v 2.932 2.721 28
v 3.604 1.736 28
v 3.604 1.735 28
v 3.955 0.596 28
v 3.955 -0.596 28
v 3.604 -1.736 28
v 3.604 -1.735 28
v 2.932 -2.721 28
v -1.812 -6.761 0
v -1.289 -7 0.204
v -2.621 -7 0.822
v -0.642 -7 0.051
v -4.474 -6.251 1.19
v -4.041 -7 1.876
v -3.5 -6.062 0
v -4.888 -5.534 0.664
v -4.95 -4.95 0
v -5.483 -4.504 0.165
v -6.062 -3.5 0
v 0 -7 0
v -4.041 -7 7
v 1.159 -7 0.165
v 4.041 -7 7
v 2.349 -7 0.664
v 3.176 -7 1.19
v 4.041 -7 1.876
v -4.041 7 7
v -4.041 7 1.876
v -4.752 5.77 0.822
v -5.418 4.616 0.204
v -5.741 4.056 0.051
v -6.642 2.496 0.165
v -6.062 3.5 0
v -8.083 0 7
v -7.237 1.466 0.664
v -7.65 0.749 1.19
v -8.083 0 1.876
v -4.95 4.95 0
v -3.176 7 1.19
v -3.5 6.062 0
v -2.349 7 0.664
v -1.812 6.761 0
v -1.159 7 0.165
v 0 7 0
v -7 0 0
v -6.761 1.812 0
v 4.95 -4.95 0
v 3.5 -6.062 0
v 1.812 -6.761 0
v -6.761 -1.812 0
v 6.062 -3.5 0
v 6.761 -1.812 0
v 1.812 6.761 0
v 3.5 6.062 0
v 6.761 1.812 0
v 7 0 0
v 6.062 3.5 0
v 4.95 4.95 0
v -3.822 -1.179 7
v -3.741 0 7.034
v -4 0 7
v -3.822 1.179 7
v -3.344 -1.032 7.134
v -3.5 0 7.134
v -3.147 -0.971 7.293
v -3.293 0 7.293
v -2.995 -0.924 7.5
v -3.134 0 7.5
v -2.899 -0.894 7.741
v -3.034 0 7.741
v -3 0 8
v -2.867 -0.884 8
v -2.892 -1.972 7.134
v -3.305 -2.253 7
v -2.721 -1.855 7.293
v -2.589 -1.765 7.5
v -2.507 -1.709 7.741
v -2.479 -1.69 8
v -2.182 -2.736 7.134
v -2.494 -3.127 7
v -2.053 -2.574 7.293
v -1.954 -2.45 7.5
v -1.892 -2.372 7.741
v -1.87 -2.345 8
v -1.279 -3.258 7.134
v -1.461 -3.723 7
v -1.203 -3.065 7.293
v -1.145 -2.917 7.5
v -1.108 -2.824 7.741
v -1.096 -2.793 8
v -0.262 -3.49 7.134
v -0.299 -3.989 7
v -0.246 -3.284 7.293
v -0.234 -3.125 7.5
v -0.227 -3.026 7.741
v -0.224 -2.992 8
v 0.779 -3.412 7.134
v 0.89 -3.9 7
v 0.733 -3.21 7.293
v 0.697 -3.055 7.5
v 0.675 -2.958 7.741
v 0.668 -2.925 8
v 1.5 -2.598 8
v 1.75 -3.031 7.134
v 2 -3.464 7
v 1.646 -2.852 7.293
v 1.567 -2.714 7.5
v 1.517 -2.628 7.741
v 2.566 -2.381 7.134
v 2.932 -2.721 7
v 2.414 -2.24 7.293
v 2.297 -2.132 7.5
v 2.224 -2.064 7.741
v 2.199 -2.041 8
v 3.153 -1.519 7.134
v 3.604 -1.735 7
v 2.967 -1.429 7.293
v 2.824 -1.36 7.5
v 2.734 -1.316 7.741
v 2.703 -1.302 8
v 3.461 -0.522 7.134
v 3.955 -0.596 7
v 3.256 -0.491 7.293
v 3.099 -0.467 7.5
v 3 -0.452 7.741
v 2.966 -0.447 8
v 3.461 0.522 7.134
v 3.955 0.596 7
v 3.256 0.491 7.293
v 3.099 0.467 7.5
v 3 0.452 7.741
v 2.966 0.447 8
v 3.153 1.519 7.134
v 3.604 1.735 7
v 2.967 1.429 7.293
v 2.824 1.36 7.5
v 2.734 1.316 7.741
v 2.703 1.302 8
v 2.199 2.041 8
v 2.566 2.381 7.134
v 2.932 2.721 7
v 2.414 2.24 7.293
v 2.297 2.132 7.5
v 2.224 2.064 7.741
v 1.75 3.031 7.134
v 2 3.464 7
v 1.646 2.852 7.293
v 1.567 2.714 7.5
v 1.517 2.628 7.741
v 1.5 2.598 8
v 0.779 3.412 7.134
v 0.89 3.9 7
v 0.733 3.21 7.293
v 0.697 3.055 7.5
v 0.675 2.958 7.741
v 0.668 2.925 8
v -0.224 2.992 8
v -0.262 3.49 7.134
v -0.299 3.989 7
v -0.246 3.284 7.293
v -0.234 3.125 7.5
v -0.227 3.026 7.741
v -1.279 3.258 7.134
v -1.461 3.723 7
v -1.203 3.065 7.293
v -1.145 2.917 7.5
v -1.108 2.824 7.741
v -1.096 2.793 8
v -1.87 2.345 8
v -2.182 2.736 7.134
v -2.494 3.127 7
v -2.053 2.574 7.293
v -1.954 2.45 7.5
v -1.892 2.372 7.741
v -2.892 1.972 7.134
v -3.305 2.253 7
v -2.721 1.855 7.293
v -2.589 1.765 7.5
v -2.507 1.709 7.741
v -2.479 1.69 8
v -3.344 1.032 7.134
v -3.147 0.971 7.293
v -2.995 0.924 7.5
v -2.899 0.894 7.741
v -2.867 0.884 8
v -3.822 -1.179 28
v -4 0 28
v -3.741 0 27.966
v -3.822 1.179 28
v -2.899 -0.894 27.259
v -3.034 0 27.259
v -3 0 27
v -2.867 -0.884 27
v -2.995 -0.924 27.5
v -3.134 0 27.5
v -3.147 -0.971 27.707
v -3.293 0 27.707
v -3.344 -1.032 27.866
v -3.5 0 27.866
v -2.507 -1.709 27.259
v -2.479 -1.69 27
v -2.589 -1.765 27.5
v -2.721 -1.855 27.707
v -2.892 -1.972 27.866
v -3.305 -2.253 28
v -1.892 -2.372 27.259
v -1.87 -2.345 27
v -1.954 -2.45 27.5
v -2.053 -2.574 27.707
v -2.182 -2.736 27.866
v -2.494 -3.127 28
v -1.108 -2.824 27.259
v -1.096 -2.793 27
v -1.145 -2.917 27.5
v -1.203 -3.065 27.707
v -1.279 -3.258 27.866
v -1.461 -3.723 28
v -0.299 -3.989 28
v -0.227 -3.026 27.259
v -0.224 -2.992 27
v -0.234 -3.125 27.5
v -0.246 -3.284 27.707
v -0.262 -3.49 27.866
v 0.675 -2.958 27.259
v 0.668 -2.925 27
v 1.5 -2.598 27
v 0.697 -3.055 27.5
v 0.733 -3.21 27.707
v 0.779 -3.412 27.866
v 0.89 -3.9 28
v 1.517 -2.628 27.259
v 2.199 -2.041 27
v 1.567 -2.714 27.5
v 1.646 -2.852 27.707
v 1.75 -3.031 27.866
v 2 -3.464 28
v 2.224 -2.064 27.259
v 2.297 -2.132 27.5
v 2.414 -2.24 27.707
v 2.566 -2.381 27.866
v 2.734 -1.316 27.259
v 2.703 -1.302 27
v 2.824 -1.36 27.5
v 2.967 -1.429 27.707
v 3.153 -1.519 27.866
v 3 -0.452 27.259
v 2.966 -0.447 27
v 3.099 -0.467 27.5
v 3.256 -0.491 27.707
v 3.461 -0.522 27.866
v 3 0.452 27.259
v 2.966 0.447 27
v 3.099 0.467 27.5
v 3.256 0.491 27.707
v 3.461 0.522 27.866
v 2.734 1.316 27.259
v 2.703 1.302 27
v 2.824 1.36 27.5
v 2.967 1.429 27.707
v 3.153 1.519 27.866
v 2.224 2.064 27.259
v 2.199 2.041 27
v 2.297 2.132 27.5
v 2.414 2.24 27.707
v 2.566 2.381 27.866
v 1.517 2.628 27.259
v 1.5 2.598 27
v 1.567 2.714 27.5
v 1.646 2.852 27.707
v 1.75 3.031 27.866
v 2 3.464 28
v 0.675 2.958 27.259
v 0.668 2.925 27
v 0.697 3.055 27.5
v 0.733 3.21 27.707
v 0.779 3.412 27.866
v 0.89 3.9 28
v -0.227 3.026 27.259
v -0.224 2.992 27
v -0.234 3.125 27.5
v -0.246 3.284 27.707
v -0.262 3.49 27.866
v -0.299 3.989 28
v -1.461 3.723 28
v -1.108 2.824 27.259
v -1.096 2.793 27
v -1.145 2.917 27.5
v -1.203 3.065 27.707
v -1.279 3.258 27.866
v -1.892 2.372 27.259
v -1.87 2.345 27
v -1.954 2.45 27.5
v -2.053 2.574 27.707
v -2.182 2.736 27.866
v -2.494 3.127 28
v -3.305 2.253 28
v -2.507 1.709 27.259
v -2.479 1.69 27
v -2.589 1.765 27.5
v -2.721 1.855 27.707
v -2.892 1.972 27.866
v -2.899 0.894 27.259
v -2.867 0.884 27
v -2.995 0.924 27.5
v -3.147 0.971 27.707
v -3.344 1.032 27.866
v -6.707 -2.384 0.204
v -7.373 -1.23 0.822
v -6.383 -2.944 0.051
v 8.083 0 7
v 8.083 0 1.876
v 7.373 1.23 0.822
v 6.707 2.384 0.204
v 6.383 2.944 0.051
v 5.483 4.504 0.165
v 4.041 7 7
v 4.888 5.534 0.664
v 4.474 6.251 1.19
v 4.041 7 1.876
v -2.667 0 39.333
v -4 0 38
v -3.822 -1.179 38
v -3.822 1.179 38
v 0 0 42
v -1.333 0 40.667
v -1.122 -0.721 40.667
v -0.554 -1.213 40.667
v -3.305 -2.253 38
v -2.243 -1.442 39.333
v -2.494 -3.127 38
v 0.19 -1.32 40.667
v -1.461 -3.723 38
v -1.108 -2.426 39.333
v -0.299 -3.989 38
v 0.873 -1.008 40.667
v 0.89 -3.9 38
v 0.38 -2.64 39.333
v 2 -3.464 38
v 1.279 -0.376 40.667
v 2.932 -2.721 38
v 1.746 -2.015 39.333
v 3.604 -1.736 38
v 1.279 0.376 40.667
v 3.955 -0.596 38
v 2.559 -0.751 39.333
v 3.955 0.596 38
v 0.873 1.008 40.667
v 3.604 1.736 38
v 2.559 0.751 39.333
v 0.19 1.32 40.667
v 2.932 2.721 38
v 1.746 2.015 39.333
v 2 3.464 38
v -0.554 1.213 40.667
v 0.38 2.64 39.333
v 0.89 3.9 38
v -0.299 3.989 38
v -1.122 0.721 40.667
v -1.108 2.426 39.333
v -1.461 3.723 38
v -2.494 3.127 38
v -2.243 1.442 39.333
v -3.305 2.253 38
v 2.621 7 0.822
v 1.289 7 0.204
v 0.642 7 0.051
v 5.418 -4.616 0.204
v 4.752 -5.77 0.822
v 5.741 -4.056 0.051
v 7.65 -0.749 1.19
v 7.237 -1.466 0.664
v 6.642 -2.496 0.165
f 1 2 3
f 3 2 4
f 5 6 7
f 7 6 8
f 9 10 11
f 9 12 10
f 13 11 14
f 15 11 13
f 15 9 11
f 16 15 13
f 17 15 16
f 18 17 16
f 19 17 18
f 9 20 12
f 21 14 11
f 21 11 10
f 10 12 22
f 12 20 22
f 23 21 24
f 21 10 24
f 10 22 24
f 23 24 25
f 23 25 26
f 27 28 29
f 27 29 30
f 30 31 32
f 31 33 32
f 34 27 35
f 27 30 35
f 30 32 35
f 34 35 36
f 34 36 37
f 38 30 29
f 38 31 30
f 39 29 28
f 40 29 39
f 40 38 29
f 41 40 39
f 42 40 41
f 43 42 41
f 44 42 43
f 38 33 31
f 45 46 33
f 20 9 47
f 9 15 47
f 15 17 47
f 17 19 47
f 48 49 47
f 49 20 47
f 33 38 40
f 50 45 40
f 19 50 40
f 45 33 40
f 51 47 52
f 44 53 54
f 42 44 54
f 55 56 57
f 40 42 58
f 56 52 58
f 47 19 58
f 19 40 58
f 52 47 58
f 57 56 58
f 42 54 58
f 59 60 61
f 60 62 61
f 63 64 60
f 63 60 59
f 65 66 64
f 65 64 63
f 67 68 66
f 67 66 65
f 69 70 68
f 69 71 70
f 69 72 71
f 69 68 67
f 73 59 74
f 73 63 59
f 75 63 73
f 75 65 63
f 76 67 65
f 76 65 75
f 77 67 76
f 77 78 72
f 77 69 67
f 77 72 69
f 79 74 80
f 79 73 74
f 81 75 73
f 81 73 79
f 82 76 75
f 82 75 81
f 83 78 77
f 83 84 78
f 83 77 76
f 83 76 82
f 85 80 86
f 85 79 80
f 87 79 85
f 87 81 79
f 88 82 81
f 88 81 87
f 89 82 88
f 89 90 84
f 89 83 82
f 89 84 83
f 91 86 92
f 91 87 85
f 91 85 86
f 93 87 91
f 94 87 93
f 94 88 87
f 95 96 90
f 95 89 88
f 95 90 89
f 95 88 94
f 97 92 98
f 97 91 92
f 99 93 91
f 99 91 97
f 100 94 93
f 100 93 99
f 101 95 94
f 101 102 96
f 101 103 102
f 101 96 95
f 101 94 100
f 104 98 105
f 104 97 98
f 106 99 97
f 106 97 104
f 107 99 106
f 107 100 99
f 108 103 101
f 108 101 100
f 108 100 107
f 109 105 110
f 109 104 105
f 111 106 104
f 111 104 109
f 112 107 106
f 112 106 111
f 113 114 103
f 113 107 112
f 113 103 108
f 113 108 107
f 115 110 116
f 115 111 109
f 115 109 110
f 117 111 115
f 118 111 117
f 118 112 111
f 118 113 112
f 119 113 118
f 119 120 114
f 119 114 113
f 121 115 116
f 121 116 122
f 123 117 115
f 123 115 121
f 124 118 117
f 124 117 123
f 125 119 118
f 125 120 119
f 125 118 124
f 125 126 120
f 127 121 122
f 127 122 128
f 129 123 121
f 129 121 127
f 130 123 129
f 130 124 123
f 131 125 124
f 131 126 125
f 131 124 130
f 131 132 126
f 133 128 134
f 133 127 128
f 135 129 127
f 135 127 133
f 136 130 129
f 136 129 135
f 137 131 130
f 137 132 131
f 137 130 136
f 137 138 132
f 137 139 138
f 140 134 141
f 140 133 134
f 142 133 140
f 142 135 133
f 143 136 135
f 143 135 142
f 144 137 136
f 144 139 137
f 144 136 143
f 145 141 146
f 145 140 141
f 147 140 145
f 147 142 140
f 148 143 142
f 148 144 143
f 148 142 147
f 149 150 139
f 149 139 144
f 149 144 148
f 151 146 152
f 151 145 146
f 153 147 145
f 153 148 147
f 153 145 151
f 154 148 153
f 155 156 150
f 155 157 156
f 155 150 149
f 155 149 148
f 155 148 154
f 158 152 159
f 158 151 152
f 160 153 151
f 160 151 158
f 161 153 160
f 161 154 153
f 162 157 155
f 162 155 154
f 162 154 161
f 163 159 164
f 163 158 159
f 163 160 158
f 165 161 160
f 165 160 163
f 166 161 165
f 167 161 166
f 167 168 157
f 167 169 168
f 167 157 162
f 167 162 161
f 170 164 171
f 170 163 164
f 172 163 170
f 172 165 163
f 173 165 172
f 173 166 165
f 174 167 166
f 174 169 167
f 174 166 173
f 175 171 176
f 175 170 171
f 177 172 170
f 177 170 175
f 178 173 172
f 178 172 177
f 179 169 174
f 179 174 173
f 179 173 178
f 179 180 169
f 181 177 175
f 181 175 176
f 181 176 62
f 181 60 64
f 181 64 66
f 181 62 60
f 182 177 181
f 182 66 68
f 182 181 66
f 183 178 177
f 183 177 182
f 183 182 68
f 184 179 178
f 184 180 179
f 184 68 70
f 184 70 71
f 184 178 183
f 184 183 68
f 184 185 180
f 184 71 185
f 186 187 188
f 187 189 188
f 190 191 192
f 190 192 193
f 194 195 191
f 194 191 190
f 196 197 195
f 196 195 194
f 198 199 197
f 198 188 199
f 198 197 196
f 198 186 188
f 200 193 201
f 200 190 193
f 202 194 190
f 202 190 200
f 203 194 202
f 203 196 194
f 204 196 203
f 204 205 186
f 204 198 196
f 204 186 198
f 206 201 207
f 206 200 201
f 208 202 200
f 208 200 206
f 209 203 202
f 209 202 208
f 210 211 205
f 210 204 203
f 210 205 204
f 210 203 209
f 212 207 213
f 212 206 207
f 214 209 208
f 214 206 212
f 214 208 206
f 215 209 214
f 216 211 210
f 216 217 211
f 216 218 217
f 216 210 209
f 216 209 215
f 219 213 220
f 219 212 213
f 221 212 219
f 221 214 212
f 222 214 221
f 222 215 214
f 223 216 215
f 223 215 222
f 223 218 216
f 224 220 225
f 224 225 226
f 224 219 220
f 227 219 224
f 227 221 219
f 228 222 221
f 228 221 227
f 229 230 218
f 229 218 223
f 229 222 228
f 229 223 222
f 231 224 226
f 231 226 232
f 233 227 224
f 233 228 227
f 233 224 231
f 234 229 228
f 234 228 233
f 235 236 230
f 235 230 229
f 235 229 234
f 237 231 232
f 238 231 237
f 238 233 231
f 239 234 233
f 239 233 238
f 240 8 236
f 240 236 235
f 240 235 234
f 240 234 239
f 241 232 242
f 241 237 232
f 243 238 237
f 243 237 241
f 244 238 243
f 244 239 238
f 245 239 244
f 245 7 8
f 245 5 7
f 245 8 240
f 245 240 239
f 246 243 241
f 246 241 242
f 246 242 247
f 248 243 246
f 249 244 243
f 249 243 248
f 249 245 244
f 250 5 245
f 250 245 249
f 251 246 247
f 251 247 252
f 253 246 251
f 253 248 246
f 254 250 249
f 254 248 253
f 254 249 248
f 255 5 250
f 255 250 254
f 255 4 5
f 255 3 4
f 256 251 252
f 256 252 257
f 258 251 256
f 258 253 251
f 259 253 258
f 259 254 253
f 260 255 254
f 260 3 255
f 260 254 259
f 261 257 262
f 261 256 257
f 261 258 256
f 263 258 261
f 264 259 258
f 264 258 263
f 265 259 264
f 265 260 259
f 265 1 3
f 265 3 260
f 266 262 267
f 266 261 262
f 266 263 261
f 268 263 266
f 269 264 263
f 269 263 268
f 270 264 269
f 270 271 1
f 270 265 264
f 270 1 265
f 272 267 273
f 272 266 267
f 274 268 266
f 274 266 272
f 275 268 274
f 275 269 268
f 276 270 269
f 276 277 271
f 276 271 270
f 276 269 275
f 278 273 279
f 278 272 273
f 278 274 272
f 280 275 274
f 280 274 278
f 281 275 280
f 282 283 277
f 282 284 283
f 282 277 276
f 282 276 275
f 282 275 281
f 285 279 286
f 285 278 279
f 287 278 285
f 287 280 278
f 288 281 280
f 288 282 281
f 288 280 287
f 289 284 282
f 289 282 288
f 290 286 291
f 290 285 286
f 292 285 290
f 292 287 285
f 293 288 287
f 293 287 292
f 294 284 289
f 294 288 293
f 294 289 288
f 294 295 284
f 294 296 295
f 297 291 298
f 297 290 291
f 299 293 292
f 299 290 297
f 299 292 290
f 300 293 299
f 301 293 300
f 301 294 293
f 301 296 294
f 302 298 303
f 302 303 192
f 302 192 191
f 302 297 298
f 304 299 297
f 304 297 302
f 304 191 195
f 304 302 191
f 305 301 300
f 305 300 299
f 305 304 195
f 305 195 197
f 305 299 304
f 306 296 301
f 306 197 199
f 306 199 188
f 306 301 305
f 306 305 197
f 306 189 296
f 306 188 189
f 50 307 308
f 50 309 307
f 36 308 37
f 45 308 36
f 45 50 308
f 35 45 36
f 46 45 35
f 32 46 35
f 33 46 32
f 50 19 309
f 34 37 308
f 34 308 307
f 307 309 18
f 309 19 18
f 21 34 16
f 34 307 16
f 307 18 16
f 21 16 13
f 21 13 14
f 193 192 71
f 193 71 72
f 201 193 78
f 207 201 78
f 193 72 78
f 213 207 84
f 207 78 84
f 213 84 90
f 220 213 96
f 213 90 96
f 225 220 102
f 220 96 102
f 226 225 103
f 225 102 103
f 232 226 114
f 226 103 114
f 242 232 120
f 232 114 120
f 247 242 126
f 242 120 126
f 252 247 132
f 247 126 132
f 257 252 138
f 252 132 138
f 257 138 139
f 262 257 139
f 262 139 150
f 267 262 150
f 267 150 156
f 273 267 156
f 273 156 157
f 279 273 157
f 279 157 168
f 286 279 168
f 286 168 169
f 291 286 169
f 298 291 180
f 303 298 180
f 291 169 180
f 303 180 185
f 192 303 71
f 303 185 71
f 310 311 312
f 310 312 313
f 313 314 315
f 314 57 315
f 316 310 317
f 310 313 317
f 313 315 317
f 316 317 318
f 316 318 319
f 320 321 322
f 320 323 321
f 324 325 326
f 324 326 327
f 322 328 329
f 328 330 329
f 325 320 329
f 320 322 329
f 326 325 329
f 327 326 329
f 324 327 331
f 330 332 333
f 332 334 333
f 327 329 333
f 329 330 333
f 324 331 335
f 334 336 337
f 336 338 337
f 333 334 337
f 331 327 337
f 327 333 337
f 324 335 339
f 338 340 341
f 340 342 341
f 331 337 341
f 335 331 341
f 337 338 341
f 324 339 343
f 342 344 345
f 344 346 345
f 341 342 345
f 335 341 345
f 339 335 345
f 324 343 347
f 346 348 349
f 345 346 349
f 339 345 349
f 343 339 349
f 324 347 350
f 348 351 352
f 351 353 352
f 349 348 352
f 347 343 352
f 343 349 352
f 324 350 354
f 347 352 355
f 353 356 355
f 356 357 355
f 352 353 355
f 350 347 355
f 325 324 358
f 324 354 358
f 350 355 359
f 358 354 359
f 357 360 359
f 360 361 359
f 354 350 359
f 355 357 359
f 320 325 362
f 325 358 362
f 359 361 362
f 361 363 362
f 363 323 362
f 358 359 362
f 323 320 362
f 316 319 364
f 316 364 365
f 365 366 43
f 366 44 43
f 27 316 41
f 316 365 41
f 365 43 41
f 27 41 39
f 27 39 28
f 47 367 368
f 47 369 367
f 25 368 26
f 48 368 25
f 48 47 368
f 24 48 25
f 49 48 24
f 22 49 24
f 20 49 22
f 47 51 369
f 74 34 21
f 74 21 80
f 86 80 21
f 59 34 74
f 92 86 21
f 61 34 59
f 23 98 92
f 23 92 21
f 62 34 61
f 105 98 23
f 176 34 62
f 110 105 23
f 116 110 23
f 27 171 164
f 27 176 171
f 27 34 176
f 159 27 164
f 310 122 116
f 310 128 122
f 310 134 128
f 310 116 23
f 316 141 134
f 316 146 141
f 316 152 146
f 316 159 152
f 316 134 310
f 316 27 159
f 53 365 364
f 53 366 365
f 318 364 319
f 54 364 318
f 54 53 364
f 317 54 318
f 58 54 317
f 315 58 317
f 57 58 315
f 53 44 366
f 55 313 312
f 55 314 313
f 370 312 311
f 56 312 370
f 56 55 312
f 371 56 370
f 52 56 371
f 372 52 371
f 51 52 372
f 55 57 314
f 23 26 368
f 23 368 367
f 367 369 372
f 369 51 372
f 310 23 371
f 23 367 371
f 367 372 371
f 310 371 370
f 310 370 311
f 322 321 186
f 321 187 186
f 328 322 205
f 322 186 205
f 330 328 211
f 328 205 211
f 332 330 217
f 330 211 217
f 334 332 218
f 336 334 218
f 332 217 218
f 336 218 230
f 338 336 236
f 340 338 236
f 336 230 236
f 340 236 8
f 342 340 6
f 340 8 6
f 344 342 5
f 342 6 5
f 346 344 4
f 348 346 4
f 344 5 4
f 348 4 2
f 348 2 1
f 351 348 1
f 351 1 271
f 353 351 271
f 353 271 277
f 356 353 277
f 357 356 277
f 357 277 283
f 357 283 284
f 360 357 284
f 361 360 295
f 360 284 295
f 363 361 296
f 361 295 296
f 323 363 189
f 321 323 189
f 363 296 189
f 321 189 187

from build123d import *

# Parameters (mm, degrees)
BOSS_EXTRUDE1_DEPTH = 7
SKETCH2_W           = 4
SKETCH2_H           = 35
SKETCH3_W           = 1
SKETCH3_H           = 21
FILLET1_R           = 1
SKETCH6_OUTSIDE_W   = 78.792
SKETCH6_OUTSIDE_H   = 76.626
SKETCH6_OUTSIDE_R   = 7
CUT_EXTRUDE1_DEPTH  = 44.339743116
CUT_EXTRUDE1_DRAFT  = -30


with BuildPart() as part:
    # Sketch1 → Boss-Extrude1 (new body)
    with BuildSketch(Plane.XY):
        Polygon((4.041451884, 7), (-4.041451884, 7), (-8.082903769, 0), (-4.041451884, -7), (4.041451884, -7), (8.082903769, 0), align=None)
    extrude(amount=BOSS_EXTRUDE1_DEPTH)

    # Sketch2 → Revolve1 (revolve)
    with BuildSketch(Plane(origin=(0, 0, 0), x_dir=(1, 0, 0), z_dir=(0, 1, 0))):
        with Locations((-2, -24.5)):
            Rectangle(SKETCH2_W, SKETCH2_H)
    revolve(axis=Axis((0, 0, -34.920005339), (0, 0, 1)))

    # Sketch3 → Cut-Revolve1 (revolve, cut)
    with BuildSketch(Plane(origin=(0, 0, 0), x_dir=(1, 0, 0), z_dir=(0, 1, 0))):
        with Locations((-3.5, -17.5)):
            Rectangle(SKETCH3_W, SKETCH3_H)
    revolve(axis=Axis((0, 0, -11.162931032), (0, 0, 1)), mode=Mode.SUBTRACT)

    # Sketch5 → Cut-Revolve11 (revolve, cut)
    with BuildSketch(Plane(origin=(0, 0, 0), x_dir=(1, 0, 0), z_dir=(0, 1, 0))):
        Polygon((-5e-05, -42), (-4, -38.00005), (-4, -42), align=None)
    revolve(axis=Axis((0, 0, -15.823423108), (0, 0, 1)), mode=Mode.SUBTRACT)

    # Fillet1
    fillet1_edges = [part.edges().sort_by_distance(p)[0] for p in [
        (3, 0, 28),
        (3, 0, 7),
    ]]
    fillet(fillet1_edges, radius=FILLET1_R - 0.0001)  # a hair under: the kernel refuses the full size


with BuildPart() as cut_extrude1_tool:
    # Sketch6 outside → Cut-Extrude1 (with draft: the straight prism first)
    with BuildSketch(Plane(origin=(0, 0, 0), x_dir=(-1, 0, 0), z_dir=(0, 0, -1))):
        Rectangle(SKETCH6_OUTSIDE_W, SKETCH6_OUTSIDE_H)
        Circle(SKETCH6_OUTSIDE_R, mode=Mode.SUBTRACT)
    extrude(amount=-CUT_EXTRUDE1_DEPTH)
    # Cut-Extrude1: the draft: its side faces are tilted about the plane it starts from
    cut_extrude1_sides = [cut_extrude1_tool.faces().sort_by_distance(p)[0] for p in [
        (0, -38.313, 22.169871558),
        (-39.396, 0, 22.169871558),
        (0, 38.313, 22.169871558),
        (39.396, 0, 22.169871558),
        (7, 0, 22.169871558),
    ]]
    draft(cut_extrude1_sides, Plane(origin=(0, 0, 0), x_dir=(-1, 0, 0), z_dir=(0, 0, -1)), CUT_EXTRUDE1_DRAFT)


with BuildPart() as part_1:
    add(part.part)

    # Cut-Extrude1: cut by cut_extrude1_tool
    add(cut_extrude1_tool.part, mode=Mode.SUBTRACT)


solid = part_1.part
